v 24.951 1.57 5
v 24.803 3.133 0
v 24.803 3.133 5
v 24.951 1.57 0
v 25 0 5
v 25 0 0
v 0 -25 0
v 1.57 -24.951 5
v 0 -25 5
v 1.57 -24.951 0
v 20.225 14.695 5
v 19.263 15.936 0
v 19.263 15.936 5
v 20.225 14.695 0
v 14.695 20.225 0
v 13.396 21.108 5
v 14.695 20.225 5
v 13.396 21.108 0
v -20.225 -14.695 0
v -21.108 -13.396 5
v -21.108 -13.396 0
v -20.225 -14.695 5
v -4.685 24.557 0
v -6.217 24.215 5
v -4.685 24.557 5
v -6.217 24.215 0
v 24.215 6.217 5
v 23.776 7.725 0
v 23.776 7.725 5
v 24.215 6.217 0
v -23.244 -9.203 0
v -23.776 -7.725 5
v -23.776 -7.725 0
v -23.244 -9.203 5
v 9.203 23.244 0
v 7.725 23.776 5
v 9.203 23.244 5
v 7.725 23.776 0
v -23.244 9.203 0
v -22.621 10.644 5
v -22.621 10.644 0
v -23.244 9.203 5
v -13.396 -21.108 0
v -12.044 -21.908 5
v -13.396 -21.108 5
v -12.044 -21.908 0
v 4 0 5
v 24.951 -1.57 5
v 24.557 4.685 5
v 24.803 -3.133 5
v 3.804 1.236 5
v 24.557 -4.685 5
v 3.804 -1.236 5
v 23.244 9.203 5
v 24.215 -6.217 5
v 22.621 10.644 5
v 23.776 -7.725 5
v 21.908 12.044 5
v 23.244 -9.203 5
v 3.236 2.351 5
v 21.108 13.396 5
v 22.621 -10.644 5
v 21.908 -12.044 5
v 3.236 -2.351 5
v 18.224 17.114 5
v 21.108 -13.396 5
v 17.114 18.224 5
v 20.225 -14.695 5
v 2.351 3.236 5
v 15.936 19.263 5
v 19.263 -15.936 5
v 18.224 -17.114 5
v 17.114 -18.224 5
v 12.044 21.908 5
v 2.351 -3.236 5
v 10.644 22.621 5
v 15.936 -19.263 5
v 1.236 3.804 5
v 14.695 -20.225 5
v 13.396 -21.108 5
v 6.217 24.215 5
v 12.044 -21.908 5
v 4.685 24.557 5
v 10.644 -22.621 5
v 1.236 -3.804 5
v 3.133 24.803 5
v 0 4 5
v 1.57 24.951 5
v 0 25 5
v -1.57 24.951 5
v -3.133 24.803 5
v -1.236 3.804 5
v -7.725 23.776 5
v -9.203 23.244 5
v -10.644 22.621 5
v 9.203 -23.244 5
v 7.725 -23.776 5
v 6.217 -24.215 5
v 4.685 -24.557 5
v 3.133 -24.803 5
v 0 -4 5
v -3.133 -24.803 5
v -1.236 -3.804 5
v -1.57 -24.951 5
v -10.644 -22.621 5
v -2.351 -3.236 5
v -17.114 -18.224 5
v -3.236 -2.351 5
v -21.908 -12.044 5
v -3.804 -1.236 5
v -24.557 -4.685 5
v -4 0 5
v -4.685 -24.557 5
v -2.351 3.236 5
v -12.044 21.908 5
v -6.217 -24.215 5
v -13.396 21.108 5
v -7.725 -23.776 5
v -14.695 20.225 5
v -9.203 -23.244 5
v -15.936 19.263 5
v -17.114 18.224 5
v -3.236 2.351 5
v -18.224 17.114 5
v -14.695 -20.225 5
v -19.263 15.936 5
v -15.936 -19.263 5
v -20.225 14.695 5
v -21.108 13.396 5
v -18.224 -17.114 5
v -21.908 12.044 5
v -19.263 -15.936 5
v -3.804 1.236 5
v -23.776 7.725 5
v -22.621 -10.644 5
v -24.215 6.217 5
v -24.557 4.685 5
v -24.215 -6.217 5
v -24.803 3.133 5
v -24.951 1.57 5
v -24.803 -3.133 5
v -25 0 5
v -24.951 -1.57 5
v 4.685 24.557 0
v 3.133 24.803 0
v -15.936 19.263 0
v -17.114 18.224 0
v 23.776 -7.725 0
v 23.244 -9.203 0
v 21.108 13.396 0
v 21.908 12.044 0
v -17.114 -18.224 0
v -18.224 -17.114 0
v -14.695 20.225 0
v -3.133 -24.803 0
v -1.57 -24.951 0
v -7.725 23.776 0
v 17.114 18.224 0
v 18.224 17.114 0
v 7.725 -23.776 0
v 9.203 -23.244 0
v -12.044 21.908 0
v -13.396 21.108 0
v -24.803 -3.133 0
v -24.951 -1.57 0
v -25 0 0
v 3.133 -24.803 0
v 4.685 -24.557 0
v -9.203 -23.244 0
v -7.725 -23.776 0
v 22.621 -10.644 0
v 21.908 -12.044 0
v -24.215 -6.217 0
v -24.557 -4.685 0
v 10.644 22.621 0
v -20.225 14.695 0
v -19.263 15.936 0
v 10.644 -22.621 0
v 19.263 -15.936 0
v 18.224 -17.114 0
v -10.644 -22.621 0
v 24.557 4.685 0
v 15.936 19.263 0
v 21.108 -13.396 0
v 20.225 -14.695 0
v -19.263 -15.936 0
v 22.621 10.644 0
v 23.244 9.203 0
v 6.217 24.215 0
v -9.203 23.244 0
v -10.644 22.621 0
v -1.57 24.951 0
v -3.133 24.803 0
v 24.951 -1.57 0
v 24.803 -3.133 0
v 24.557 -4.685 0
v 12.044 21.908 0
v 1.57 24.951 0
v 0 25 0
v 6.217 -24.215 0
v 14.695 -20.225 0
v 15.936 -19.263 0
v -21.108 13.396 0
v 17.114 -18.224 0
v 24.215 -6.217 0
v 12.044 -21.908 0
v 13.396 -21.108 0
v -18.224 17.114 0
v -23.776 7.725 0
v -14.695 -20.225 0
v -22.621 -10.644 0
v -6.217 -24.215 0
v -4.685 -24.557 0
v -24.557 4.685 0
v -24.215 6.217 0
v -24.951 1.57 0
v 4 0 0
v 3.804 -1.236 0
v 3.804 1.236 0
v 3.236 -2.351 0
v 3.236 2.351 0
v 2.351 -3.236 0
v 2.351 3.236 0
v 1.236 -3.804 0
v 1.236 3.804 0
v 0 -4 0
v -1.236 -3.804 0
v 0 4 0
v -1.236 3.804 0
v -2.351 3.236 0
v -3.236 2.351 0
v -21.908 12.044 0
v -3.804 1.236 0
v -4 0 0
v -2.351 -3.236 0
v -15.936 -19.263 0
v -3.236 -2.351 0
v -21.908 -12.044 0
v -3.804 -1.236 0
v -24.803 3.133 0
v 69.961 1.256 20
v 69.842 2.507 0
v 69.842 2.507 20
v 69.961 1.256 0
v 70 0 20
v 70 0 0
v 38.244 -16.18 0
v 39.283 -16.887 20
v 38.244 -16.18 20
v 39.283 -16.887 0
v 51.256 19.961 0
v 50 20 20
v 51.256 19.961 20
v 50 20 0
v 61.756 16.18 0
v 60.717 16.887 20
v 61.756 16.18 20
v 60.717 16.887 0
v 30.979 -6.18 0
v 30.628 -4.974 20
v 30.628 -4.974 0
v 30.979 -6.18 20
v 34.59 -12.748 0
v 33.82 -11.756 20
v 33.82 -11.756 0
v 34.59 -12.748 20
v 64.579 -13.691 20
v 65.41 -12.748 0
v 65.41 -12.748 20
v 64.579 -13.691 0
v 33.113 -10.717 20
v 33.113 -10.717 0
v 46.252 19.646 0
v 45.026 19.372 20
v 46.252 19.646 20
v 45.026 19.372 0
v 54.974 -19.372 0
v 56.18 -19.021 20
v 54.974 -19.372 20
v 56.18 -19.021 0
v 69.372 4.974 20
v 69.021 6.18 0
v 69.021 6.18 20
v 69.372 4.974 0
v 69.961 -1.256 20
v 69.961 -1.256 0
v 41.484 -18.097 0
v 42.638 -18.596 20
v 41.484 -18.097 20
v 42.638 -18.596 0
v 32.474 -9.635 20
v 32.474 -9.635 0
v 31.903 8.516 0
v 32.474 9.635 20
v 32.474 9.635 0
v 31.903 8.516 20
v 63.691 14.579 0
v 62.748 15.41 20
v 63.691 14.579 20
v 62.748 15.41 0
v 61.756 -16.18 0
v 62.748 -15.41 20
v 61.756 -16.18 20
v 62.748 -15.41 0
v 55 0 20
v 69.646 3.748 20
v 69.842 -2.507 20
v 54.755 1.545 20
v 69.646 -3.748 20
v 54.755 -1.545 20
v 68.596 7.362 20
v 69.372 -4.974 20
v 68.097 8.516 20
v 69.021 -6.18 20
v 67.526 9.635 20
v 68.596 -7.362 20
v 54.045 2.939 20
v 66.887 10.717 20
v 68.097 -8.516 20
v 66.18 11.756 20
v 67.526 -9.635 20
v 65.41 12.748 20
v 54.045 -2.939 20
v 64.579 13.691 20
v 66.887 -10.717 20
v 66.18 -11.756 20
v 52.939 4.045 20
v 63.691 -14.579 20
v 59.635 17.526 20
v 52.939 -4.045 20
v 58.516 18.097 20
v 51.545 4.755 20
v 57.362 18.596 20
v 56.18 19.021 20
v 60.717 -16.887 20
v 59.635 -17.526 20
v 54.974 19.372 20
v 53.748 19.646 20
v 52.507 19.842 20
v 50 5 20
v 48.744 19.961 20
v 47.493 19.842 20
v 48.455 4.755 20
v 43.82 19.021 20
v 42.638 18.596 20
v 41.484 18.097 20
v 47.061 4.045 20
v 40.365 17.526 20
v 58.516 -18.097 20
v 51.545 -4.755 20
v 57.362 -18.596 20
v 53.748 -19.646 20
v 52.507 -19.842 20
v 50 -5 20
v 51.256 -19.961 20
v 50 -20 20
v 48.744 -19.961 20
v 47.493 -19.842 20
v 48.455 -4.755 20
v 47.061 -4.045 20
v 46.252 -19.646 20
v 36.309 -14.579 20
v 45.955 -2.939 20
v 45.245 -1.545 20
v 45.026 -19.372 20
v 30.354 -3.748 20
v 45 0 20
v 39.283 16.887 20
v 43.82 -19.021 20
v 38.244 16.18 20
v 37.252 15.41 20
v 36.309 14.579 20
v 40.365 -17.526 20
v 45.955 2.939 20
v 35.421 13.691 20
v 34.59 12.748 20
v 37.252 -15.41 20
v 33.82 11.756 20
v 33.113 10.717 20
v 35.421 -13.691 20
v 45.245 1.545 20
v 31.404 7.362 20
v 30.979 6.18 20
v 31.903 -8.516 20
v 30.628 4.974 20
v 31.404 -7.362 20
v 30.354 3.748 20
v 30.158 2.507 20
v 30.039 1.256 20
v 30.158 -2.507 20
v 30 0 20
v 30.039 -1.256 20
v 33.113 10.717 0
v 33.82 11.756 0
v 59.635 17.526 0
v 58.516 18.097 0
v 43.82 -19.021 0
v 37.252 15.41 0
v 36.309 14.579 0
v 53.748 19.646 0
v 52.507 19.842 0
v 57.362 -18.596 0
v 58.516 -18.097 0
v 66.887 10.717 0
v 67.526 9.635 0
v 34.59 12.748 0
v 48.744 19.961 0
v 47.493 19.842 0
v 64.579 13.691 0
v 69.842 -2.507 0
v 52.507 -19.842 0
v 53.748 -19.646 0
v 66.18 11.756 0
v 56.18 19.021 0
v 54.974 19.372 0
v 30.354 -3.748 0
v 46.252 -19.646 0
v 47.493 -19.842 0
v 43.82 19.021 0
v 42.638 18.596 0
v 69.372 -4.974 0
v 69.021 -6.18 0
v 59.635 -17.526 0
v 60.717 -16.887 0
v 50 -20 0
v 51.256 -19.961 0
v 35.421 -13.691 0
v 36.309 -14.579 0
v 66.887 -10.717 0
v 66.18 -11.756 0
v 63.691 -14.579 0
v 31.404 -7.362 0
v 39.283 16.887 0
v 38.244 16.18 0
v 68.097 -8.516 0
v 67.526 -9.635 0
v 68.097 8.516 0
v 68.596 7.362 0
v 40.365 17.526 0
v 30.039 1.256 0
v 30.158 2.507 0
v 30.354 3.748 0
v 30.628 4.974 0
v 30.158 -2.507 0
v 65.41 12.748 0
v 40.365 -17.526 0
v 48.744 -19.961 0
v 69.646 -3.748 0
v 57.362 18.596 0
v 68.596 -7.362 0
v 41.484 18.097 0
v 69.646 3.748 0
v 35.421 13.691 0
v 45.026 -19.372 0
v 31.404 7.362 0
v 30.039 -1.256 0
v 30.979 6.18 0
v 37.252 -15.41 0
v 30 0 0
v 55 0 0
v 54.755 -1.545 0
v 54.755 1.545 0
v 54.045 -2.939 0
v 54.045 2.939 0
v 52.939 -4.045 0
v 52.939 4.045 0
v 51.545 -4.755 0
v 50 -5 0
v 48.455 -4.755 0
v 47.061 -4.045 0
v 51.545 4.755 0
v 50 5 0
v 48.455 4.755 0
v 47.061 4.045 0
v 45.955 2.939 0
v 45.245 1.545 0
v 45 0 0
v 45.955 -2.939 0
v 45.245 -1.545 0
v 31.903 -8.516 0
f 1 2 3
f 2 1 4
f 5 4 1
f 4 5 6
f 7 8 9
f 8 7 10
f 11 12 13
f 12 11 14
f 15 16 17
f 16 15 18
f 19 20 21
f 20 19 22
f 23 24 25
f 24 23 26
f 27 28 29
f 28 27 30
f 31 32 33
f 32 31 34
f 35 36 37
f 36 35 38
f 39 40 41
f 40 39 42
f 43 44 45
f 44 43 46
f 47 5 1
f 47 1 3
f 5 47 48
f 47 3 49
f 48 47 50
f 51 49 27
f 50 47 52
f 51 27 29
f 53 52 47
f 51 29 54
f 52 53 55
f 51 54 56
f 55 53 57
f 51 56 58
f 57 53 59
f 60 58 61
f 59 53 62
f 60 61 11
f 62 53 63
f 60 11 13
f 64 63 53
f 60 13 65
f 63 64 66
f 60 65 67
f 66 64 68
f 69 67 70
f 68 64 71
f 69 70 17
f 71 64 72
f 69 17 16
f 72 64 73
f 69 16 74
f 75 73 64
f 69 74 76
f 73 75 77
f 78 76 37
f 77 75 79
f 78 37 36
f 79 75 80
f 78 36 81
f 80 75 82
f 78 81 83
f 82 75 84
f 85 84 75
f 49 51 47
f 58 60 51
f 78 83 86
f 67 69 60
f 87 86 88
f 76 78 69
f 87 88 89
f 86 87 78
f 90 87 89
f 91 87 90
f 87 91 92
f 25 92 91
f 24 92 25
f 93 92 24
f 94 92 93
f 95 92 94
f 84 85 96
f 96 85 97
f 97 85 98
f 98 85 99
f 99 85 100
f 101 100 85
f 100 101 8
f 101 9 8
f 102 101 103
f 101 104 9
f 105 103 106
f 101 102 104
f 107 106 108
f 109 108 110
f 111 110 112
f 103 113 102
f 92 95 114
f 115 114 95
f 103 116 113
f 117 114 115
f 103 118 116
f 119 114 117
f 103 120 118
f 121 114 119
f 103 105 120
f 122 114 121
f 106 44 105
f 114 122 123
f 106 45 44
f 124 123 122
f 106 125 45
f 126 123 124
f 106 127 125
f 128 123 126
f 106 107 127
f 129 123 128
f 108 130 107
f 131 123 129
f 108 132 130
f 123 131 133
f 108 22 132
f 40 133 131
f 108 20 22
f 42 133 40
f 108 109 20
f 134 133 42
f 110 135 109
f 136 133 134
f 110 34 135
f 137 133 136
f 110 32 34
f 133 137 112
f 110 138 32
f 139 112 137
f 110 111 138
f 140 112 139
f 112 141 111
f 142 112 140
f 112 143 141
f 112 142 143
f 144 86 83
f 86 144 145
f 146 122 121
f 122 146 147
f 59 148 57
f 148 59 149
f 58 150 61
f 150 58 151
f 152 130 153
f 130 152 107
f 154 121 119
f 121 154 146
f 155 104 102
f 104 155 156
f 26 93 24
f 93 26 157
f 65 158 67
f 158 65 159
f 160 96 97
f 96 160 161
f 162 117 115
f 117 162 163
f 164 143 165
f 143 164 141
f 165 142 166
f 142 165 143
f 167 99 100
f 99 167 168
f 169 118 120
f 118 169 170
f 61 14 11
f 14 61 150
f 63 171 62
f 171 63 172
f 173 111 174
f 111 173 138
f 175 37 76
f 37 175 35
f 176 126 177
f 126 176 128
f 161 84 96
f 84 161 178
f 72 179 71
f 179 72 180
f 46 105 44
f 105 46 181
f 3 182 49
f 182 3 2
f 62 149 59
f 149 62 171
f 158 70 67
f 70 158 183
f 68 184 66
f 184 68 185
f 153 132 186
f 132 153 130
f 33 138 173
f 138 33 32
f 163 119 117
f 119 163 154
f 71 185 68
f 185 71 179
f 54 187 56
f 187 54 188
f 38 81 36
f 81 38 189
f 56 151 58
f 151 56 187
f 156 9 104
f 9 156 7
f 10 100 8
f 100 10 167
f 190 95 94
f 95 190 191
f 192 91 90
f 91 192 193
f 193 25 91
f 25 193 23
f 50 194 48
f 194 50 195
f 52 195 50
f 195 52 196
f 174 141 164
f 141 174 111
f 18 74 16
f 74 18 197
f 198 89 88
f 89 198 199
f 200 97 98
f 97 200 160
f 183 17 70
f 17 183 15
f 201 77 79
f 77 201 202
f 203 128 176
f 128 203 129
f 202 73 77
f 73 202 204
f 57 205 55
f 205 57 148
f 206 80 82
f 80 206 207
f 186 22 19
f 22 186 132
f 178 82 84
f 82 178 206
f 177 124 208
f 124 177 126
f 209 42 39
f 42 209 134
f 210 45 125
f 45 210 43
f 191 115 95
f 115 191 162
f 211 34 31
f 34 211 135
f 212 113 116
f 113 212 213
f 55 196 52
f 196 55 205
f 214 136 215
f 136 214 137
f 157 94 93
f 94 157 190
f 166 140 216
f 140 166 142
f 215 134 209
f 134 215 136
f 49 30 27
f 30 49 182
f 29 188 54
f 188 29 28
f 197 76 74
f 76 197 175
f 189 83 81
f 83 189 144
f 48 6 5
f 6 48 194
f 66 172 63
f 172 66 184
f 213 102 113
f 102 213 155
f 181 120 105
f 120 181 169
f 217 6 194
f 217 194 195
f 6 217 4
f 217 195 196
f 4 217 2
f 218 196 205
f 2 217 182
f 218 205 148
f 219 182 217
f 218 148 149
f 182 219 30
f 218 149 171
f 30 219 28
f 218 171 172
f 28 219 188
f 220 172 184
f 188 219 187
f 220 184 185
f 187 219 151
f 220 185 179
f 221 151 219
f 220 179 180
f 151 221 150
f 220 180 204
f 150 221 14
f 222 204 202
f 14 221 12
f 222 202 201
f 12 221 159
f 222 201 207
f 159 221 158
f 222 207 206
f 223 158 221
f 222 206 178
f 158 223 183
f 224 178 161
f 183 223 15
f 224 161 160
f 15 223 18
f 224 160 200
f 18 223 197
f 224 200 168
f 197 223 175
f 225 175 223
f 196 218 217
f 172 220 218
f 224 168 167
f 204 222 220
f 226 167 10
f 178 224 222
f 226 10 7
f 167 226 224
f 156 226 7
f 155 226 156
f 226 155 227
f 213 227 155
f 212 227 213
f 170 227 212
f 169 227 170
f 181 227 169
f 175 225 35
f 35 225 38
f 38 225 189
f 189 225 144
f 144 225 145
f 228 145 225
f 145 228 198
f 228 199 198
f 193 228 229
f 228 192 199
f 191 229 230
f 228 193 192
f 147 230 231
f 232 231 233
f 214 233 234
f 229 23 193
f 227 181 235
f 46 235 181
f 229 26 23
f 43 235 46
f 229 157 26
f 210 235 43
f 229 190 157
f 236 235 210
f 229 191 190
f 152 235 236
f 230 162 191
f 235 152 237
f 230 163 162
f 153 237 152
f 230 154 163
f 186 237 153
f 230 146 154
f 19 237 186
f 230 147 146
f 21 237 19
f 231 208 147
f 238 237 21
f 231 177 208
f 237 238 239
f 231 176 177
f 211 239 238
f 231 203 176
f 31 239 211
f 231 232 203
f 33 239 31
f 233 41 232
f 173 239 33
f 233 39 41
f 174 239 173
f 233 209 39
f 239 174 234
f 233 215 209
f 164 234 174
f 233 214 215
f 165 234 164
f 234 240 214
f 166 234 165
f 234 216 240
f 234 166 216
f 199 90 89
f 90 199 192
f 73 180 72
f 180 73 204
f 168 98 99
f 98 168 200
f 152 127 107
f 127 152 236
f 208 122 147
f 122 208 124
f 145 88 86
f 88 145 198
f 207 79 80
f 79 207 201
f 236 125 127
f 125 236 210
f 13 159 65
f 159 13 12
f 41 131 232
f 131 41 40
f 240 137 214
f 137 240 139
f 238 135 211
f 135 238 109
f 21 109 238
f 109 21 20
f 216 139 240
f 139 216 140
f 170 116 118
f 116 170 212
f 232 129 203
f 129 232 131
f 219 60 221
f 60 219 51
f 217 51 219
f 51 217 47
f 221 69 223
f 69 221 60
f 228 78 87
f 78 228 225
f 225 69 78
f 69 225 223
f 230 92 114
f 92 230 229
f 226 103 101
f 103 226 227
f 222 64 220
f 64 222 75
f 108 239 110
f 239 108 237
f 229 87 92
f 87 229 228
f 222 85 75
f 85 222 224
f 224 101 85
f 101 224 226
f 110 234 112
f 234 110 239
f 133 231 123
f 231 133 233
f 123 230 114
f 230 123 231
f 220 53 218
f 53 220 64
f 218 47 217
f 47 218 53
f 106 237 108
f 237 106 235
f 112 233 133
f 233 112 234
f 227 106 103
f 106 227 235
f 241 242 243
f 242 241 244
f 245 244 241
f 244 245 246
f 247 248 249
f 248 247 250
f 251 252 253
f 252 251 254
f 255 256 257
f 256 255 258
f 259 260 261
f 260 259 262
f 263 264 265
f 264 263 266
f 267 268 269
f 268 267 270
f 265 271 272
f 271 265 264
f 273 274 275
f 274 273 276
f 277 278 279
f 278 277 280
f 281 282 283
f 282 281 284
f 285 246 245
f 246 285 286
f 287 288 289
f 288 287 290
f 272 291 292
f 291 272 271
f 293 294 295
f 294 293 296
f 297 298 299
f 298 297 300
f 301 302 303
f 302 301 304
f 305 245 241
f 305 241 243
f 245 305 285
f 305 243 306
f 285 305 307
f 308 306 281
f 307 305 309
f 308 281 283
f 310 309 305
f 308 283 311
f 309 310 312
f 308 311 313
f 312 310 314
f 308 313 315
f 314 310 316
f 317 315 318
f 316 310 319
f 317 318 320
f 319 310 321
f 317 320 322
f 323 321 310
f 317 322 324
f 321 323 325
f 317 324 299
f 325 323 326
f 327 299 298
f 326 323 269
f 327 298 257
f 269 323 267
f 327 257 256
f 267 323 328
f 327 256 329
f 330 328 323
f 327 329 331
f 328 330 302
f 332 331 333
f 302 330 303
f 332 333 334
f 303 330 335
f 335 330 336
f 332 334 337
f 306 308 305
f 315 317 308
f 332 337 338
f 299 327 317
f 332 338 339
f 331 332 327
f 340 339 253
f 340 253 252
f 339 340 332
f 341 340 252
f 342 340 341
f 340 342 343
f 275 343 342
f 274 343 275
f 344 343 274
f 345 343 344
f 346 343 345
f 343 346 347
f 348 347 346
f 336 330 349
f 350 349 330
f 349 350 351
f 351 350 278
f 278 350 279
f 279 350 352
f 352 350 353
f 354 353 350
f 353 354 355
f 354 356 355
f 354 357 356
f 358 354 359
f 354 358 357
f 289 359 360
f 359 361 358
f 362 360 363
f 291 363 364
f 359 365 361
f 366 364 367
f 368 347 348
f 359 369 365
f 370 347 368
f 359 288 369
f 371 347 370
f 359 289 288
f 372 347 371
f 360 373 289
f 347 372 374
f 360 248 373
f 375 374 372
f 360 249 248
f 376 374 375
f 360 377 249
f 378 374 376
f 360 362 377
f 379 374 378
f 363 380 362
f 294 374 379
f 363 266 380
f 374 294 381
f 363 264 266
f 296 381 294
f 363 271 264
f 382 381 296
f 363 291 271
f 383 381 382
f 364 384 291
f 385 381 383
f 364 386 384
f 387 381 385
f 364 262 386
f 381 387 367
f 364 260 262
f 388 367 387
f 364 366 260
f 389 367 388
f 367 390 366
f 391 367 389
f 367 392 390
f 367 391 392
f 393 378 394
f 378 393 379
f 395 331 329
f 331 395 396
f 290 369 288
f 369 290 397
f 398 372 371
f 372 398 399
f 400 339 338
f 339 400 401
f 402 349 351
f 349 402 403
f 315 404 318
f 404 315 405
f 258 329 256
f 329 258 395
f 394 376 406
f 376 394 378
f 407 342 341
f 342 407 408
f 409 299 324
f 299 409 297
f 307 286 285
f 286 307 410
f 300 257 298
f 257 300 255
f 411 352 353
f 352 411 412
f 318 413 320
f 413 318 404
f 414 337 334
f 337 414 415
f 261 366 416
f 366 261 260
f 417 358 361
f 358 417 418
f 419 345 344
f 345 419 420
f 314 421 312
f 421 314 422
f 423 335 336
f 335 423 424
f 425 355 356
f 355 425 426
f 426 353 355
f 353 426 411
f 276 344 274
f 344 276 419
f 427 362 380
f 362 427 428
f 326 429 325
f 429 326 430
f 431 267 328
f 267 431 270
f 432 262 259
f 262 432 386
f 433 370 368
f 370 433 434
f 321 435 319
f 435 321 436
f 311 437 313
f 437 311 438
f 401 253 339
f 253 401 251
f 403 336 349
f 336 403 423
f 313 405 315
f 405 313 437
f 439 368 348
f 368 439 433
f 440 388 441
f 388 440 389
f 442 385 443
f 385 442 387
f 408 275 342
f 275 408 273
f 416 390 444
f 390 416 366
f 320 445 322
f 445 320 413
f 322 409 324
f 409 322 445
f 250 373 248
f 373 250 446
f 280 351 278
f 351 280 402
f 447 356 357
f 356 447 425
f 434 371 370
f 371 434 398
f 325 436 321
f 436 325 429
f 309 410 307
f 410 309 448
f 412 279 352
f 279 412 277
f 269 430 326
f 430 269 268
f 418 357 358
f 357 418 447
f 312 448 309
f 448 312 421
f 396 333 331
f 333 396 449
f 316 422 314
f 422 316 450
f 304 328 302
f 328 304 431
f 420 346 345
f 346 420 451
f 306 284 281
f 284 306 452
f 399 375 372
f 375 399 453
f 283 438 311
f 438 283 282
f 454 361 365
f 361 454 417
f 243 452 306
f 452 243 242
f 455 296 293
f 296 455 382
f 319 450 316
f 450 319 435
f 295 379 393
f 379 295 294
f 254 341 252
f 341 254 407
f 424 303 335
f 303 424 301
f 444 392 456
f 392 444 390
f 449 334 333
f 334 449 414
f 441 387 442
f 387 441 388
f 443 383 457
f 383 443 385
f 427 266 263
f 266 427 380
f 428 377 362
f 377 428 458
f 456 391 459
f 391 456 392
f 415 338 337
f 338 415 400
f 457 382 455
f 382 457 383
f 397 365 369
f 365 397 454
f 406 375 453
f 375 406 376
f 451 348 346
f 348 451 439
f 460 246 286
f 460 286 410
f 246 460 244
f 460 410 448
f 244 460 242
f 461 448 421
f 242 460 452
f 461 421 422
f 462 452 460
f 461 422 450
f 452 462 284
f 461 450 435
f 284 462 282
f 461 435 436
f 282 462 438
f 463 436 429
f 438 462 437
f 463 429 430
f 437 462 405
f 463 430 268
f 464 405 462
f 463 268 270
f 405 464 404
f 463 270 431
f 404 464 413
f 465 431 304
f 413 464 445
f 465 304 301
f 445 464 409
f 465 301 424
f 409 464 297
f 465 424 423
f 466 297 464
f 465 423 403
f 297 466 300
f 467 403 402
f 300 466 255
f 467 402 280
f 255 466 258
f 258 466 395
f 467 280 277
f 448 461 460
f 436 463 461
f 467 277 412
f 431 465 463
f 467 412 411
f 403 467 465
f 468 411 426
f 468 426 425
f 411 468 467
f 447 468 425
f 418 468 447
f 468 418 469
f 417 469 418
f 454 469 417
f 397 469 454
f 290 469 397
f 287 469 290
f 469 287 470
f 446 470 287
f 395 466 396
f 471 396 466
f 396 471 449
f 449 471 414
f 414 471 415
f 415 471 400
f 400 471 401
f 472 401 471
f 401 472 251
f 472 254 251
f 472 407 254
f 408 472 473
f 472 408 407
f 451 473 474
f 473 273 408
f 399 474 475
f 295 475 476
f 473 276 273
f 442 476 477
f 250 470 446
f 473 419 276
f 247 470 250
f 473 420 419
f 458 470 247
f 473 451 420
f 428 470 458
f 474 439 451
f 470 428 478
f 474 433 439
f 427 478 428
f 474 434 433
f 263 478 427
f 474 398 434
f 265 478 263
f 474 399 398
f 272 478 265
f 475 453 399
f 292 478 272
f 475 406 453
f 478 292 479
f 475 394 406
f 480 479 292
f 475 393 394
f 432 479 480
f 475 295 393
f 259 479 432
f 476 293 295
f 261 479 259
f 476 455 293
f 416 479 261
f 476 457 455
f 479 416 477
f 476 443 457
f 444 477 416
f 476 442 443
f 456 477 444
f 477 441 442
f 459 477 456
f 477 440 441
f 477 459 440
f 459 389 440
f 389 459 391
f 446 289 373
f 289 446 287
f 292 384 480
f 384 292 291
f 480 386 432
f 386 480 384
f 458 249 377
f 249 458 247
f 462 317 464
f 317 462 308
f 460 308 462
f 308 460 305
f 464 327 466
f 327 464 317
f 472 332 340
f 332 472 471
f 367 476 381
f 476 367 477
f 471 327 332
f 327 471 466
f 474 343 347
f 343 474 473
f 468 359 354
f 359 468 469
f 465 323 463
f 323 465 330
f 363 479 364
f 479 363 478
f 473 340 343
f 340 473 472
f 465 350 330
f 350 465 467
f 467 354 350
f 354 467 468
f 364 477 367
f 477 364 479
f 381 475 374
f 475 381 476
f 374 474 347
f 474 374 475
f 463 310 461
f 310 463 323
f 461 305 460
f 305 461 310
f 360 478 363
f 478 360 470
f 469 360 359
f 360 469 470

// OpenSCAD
//----------------------------------------------------------
//-- Tutorial OpenScad
//-- Juan Gonzalez-Gomez (Obijuan) juan@iearobotics.com
//----------------------------------------------------------
//-- (c) Mayo, 2012
//-- Licencia GPL
//----------------------------------------------------------
//-- Rueda modularizada. Ejemplo de como definir modulos
//----------------------------------------------------------

module rueda_simple(grosor, diametro, diam_eje)
{
  //-- Construcción de la rueda a partir de
  //-- los parámetros
  difference() {
    //-- Base de la rueda
    cylinder(r=diametro/2, h=grosor,$fn=100);

    //-- Taladro del eje
    cylinder(r=diam_eje/2, h=3*grosor,$fn=20,center=true);
  }
}

rueda_simple(diametro=50, grosor=5, diam_eje=8);

translate([50,0,0])
  rueda_simple(diametro=40, grosor=20, diam_eje=10);
